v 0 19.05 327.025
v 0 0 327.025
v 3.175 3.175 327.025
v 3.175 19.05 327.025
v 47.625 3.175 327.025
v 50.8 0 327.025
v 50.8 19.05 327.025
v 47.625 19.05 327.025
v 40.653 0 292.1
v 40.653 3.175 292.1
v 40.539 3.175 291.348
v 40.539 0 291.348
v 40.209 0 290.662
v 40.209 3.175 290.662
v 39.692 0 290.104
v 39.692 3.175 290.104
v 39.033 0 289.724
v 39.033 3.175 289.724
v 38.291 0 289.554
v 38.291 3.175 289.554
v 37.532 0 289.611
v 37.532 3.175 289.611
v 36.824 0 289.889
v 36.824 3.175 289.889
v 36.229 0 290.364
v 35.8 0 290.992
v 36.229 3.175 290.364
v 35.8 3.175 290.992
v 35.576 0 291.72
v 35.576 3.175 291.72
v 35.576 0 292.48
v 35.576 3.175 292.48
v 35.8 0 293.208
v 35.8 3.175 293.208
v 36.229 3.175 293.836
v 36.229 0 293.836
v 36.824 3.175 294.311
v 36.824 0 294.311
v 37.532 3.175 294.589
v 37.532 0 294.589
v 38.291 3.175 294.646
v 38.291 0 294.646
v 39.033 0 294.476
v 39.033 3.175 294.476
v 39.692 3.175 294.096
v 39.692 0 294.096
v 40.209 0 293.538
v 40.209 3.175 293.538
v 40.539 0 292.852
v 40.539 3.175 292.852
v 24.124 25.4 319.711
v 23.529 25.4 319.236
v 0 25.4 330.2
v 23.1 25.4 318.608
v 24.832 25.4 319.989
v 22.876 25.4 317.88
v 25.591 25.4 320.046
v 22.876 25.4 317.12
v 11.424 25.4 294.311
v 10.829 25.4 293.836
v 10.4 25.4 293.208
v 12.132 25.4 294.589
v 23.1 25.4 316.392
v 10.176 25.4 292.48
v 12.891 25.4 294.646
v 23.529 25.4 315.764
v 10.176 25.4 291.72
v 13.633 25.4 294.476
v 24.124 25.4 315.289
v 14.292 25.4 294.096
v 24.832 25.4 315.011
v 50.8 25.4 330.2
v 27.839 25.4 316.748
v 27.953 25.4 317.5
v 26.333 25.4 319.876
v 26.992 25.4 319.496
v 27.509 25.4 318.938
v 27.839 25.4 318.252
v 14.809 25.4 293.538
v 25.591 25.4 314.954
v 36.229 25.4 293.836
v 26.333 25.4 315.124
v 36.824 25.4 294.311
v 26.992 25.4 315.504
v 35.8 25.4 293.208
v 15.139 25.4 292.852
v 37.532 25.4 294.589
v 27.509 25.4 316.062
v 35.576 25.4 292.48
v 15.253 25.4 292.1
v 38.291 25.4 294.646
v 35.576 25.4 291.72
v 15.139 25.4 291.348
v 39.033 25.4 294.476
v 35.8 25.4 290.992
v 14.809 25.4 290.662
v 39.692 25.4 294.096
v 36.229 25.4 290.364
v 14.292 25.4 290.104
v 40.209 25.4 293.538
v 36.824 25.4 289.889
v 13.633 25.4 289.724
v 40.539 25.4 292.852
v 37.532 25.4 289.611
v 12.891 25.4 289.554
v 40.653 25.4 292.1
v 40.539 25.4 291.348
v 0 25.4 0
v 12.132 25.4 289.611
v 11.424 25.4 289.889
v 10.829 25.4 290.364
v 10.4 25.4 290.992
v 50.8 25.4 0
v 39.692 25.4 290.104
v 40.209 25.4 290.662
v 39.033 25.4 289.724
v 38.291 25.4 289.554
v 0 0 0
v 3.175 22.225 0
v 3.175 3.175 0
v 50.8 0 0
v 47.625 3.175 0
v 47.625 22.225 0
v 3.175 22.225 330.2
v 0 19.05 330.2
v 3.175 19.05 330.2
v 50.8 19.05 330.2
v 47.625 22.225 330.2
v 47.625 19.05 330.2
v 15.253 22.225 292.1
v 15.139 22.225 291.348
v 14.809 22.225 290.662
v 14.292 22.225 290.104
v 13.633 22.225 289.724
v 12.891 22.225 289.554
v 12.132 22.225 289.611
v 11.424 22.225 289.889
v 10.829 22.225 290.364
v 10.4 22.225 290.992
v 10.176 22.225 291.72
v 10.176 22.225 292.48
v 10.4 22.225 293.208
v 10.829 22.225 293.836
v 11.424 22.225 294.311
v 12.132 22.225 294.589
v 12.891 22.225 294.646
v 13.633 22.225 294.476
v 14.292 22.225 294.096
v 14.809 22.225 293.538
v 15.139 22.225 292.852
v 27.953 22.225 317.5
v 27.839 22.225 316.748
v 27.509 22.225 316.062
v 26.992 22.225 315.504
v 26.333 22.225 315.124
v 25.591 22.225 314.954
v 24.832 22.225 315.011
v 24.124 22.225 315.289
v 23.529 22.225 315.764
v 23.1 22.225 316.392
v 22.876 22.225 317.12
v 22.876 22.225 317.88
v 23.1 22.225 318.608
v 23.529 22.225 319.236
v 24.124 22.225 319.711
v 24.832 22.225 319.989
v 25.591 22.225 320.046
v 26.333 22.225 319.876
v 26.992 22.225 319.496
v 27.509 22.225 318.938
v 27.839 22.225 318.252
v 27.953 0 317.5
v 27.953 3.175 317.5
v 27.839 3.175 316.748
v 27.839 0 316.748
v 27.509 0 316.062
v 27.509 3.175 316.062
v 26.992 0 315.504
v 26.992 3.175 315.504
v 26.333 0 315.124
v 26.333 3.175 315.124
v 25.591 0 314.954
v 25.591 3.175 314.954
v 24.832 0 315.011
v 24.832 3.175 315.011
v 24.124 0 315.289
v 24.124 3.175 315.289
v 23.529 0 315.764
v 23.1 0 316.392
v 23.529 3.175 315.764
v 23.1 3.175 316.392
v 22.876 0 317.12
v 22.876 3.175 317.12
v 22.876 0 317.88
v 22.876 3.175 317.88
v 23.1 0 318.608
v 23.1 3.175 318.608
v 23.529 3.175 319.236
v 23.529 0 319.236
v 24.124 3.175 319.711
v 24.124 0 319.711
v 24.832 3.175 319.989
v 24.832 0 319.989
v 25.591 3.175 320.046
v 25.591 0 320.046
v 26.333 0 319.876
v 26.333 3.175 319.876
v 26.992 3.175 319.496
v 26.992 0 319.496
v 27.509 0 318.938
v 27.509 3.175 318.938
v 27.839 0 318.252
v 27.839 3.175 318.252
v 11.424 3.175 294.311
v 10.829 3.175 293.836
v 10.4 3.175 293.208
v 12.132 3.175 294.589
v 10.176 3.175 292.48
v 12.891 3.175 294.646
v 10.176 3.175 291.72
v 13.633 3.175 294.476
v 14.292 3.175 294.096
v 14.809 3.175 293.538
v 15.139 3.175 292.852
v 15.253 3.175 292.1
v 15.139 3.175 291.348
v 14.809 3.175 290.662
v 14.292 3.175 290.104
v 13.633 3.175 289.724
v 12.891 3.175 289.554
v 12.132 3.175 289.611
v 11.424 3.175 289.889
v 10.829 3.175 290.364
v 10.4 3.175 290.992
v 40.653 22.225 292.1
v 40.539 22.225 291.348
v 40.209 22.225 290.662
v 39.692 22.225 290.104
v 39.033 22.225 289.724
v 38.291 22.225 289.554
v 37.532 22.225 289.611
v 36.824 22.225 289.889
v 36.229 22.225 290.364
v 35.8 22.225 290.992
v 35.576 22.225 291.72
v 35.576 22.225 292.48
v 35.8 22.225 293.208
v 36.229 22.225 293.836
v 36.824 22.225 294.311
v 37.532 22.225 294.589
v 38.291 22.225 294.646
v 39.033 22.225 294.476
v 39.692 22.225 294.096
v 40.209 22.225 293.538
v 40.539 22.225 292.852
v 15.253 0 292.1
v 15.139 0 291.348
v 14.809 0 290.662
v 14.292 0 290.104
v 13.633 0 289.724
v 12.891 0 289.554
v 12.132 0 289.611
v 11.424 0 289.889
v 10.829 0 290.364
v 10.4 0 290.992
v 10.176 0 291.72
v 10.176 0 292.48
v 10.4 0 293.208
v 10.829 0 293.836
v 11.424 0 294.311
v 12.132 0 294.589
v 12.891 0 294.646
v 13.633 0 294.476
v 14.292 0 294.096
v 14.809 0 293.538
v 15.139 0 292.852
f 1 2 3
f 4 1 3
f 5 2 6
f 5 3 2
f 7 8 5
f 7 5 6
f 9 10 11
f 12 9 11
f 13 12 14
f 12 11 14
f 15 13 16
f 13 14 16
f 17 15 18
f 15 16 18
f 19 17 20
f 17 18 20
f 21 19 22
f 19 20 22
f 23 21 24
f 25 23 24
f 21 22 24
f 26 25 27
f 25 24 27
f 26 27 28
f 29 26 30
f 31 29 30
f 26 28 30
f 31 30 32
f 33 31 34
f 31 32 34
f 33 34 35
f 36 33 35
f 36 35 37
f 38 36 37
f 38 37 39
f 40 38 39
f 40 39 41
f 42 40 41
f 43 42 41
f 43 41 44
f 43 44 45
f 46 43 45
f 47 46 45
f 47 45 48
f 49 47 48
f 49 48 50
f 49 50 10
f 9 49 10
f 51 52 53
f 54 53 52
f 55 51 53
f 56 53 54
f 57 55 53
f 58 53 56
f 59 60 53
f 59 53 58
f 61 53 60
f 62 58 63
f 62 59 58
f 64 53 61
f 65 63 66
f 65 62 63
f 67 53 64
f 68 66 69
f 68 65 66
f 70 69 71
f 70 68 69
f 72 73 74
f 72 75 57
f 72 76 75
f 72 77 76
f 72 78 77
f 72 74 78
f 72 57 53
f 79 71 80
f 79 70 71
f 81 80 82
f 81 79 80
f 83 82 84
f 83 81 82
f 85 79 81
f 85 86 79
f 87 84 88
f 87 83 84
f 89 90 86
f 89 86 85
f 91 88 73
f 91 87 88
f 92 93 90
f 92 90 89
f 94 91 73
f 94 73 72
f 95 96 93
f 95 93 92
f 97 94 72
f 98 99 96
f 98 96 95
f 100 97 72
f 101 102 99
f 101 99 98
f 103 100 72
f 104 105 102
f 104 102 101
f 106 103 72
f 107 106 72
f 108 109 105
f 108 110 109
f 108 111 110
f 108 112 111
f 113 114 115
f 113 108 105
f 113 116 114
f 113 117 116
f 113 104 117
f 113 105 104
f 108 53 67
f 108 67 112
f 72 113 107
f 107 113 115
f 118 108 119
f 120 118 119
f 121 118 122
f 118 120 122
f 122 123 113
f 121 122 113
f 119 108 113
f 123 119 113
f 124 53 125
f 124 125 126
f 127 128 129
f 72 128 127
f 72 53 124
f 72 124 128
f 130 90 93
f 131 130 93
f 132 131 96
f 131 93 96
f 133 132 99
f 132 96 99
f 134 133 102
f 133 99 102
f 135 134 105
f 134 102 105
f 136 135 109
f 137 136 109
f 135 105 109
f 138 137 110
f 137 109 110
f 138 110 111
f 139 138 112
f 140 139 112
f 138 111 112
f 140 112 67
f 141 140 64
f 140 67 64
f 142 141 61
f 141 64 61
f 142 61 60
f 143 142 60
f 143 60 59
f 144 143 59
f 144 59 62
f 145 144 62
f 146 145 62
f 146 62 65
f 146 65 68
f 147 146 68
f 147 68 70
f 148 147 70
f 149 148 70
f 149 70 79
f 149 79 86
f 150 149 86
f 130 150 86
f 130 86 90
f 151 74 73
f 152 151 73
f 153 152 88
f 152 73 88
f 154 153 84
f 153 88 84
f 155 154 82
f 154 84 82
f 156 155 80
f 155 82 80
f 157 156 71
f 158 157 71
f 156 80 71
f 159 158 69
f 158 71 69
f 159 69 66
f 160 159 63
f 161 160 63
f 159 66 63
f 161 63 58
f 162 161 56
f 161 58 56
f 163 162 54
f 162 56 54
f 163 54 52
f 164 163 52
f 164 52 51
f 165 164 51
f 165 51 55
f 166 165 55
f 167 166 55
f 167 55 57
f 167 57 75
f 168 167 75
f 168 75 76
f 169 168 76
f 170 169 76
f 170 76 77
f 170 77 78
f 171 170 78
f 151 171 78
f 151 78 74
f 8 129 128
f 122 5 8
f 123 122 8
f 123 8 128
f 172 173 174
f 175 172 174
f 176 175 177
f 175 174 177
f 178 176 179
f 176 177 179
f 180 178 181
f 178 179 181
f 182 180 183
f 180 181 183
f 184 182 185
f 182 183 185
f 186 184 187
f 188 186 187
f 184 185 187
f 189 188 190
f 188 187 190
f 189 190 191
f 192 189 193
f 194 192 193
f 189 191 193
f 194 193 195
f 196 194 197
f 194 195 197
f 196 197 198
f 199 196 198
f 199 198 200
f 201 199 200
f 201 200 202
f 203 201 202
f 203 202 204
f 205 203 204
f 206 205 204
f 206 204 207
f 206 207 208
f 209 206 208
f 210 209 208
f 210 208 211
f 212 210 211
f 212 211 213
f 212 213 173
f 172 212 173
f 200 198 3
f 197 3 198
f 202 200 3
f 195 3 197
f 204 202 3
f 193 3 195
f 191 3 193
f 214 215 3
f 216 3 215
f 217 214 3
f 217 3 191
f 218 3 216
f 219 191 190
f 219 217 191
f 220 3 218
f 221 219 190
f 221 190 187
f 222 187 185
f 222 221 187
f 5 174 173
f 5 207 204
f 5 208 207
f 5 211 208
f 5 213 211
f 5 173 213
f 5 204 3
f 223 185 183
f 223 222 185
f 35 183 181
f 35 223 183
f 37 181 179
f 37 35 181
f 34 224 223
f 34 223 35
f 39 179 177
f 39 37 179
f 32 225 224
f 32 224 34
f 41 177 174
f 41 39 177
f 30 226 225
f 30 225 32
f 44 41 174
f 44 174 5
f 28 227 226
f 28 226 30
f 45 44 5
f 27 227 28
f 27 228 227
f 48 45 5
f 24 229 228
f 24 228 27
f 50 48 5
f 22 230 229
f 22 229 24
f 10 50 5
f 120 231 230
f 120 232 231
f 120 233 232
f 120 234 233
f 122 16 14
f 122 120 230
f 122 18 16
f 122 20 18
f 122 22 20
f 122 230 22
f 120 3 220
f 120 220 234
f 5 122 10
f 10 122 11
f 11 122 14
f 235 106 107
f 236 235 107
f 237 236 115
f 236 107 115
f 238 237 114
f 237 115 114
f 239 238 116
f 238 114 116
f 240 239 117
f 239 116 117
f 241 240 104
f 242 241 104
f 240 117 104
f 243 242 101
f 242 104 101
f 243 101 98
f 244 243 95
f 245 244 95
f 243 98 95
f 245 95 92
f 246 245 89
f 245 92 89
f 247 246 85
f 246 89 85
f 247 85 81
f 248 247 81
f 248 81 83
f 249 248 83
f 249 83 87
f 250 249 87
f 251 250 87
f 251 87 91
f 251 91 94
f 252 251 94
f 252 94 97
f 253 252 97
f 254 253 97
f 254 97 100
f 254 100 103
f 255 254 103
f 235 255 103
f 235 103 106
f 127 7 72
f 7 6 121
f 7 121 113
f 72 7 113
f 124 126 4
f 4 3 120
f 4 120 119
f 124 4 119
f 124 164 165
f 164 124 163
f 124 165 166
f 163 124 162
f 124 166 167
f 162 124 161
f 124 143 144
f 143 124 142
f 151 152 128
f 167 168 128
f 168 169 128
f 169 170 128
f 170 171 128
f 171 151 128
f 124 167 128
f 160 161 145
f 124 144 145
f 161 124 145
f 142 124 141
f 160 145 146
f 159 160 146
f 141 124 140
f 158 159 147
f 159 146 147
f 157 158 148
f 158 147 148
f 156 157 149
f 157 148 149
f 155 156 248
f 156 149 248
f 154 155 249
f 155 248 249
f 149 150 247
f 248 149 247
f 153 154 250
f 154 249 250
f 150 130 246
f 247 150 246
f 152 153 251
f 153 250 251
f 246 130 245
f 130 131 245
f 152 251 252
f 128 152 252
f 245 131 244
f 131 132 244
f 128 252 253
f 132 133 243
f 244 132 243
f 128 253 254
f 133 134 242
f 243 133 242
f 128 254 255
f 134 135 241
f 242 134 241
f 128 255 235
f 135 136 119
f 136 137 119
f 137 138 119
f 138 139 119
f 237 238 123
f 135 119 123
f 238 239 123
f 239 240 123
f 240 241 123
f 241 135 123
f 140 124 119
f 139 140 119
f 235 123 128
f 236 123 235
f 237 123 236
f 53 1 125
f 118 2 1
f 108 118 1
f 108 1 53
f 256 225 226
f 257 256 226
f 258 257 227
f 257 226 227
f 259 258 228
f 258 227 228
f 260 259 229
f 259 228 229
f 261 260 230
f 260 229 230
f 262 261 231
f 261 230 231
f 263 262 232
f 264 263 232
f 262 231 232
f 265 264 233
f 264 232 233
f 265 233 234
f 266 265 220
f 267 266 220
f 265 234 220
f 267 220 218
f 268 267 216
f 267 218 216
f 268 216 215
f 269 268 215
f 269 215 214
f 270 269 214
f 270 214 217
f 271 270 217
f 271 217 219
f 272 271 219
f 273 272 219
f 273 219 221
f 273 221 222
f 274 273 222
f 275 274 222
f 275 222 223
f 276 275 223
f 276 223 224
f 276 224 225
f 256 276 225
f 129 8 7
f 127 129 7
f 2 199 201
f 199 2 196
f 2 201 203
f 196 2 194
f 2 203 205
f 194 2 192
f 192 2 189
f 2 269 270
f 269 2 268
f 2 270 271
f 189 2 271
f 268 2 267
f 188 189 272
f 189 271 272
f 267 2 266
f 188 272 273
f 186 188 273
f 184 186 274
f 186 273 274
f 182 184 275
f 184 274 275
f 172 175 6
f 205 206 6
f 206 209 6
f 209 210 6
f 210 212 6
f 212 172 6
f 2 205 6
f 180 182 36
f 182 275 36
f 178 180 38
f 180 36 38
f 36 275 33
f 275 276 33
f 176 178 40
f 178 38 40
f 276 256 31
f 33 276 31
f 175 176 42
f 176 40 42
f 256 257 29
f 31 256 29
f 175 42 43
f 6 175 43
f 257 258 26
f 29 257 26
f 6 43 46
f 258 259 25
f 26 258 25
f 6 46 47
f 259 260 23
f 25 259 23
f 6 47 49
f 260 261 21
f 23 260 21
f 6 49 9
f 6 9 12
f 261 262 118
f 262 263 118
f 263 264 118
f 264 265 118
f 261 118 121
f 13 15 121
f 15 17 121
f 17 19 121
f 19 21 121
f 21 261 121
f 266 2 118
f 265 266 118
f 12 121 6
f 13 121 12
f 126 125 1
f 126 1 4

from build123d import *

# Parameters (mm, degrees)
SKETCH1_W           = 50.8
SKETCH1_H           = 25.4
SKETCH1_W_2         = 44.45
SKETCH1_H_2         = 19.05
BOSS_EXTRUDE1_DEPTH = 330.2
SKETCH2_W           = 50.8
SKETCH2_H           = 19.05
CUT_EXTRUDE1_DEPTH  = 3.175
SKETCH3_R           = 2.5527
CUT_EXTRUDE2_DEPTH  = 44.45


with BuildPart() as part:
    # Sketch1 → Boss-Extrude1 (new body)
    with BuildSketch(Plane.XY):
        with Locations((25.4, 12.7)):
            Rectangle(SKETCH1_W, SKETCH1_H)
        with Locations((25.4, 12.7)):
            Rectangle(SKETCH1_W_2, SKETCH1_H_2, mode=Mode.SUBTRACT)
    extrude(amount=BOSS_EXTRUDE1_DEPTH)

    # Sketch2 → Cut-Extrude1 (cut)
    with BuildSketch(Plane.XY.offset(330.2)):
        with Locations((25.4, 9.525)):
            Rectangle(SKETCH2_W, SKETCH2_H)
    extrude(amount=-CUT_EXTRUDE1_DEPTH, mode=Mode.SUBTRACT)

    # Sketch3 → Cut-Extrude2 (cut)
    with BuildSketch(Plane(origin=(0, 25.4, 0), x_dir=(1, 0, 0), z_dir=(0, 1, 0))):
        with Locations((12.7, -292.1)):
            Circle(SKETCH3_R)
        with Locations((38.1, -292.1)):
            Circle(SKETCH3_R)
        with Locations((25.4, -317.5)):
            Circle(SKETCH3_R)
    extrude(amount=-CUT_EXTRUDE2_DEPTH, mode=Mode.SUBTRACT)


solid = part.part
